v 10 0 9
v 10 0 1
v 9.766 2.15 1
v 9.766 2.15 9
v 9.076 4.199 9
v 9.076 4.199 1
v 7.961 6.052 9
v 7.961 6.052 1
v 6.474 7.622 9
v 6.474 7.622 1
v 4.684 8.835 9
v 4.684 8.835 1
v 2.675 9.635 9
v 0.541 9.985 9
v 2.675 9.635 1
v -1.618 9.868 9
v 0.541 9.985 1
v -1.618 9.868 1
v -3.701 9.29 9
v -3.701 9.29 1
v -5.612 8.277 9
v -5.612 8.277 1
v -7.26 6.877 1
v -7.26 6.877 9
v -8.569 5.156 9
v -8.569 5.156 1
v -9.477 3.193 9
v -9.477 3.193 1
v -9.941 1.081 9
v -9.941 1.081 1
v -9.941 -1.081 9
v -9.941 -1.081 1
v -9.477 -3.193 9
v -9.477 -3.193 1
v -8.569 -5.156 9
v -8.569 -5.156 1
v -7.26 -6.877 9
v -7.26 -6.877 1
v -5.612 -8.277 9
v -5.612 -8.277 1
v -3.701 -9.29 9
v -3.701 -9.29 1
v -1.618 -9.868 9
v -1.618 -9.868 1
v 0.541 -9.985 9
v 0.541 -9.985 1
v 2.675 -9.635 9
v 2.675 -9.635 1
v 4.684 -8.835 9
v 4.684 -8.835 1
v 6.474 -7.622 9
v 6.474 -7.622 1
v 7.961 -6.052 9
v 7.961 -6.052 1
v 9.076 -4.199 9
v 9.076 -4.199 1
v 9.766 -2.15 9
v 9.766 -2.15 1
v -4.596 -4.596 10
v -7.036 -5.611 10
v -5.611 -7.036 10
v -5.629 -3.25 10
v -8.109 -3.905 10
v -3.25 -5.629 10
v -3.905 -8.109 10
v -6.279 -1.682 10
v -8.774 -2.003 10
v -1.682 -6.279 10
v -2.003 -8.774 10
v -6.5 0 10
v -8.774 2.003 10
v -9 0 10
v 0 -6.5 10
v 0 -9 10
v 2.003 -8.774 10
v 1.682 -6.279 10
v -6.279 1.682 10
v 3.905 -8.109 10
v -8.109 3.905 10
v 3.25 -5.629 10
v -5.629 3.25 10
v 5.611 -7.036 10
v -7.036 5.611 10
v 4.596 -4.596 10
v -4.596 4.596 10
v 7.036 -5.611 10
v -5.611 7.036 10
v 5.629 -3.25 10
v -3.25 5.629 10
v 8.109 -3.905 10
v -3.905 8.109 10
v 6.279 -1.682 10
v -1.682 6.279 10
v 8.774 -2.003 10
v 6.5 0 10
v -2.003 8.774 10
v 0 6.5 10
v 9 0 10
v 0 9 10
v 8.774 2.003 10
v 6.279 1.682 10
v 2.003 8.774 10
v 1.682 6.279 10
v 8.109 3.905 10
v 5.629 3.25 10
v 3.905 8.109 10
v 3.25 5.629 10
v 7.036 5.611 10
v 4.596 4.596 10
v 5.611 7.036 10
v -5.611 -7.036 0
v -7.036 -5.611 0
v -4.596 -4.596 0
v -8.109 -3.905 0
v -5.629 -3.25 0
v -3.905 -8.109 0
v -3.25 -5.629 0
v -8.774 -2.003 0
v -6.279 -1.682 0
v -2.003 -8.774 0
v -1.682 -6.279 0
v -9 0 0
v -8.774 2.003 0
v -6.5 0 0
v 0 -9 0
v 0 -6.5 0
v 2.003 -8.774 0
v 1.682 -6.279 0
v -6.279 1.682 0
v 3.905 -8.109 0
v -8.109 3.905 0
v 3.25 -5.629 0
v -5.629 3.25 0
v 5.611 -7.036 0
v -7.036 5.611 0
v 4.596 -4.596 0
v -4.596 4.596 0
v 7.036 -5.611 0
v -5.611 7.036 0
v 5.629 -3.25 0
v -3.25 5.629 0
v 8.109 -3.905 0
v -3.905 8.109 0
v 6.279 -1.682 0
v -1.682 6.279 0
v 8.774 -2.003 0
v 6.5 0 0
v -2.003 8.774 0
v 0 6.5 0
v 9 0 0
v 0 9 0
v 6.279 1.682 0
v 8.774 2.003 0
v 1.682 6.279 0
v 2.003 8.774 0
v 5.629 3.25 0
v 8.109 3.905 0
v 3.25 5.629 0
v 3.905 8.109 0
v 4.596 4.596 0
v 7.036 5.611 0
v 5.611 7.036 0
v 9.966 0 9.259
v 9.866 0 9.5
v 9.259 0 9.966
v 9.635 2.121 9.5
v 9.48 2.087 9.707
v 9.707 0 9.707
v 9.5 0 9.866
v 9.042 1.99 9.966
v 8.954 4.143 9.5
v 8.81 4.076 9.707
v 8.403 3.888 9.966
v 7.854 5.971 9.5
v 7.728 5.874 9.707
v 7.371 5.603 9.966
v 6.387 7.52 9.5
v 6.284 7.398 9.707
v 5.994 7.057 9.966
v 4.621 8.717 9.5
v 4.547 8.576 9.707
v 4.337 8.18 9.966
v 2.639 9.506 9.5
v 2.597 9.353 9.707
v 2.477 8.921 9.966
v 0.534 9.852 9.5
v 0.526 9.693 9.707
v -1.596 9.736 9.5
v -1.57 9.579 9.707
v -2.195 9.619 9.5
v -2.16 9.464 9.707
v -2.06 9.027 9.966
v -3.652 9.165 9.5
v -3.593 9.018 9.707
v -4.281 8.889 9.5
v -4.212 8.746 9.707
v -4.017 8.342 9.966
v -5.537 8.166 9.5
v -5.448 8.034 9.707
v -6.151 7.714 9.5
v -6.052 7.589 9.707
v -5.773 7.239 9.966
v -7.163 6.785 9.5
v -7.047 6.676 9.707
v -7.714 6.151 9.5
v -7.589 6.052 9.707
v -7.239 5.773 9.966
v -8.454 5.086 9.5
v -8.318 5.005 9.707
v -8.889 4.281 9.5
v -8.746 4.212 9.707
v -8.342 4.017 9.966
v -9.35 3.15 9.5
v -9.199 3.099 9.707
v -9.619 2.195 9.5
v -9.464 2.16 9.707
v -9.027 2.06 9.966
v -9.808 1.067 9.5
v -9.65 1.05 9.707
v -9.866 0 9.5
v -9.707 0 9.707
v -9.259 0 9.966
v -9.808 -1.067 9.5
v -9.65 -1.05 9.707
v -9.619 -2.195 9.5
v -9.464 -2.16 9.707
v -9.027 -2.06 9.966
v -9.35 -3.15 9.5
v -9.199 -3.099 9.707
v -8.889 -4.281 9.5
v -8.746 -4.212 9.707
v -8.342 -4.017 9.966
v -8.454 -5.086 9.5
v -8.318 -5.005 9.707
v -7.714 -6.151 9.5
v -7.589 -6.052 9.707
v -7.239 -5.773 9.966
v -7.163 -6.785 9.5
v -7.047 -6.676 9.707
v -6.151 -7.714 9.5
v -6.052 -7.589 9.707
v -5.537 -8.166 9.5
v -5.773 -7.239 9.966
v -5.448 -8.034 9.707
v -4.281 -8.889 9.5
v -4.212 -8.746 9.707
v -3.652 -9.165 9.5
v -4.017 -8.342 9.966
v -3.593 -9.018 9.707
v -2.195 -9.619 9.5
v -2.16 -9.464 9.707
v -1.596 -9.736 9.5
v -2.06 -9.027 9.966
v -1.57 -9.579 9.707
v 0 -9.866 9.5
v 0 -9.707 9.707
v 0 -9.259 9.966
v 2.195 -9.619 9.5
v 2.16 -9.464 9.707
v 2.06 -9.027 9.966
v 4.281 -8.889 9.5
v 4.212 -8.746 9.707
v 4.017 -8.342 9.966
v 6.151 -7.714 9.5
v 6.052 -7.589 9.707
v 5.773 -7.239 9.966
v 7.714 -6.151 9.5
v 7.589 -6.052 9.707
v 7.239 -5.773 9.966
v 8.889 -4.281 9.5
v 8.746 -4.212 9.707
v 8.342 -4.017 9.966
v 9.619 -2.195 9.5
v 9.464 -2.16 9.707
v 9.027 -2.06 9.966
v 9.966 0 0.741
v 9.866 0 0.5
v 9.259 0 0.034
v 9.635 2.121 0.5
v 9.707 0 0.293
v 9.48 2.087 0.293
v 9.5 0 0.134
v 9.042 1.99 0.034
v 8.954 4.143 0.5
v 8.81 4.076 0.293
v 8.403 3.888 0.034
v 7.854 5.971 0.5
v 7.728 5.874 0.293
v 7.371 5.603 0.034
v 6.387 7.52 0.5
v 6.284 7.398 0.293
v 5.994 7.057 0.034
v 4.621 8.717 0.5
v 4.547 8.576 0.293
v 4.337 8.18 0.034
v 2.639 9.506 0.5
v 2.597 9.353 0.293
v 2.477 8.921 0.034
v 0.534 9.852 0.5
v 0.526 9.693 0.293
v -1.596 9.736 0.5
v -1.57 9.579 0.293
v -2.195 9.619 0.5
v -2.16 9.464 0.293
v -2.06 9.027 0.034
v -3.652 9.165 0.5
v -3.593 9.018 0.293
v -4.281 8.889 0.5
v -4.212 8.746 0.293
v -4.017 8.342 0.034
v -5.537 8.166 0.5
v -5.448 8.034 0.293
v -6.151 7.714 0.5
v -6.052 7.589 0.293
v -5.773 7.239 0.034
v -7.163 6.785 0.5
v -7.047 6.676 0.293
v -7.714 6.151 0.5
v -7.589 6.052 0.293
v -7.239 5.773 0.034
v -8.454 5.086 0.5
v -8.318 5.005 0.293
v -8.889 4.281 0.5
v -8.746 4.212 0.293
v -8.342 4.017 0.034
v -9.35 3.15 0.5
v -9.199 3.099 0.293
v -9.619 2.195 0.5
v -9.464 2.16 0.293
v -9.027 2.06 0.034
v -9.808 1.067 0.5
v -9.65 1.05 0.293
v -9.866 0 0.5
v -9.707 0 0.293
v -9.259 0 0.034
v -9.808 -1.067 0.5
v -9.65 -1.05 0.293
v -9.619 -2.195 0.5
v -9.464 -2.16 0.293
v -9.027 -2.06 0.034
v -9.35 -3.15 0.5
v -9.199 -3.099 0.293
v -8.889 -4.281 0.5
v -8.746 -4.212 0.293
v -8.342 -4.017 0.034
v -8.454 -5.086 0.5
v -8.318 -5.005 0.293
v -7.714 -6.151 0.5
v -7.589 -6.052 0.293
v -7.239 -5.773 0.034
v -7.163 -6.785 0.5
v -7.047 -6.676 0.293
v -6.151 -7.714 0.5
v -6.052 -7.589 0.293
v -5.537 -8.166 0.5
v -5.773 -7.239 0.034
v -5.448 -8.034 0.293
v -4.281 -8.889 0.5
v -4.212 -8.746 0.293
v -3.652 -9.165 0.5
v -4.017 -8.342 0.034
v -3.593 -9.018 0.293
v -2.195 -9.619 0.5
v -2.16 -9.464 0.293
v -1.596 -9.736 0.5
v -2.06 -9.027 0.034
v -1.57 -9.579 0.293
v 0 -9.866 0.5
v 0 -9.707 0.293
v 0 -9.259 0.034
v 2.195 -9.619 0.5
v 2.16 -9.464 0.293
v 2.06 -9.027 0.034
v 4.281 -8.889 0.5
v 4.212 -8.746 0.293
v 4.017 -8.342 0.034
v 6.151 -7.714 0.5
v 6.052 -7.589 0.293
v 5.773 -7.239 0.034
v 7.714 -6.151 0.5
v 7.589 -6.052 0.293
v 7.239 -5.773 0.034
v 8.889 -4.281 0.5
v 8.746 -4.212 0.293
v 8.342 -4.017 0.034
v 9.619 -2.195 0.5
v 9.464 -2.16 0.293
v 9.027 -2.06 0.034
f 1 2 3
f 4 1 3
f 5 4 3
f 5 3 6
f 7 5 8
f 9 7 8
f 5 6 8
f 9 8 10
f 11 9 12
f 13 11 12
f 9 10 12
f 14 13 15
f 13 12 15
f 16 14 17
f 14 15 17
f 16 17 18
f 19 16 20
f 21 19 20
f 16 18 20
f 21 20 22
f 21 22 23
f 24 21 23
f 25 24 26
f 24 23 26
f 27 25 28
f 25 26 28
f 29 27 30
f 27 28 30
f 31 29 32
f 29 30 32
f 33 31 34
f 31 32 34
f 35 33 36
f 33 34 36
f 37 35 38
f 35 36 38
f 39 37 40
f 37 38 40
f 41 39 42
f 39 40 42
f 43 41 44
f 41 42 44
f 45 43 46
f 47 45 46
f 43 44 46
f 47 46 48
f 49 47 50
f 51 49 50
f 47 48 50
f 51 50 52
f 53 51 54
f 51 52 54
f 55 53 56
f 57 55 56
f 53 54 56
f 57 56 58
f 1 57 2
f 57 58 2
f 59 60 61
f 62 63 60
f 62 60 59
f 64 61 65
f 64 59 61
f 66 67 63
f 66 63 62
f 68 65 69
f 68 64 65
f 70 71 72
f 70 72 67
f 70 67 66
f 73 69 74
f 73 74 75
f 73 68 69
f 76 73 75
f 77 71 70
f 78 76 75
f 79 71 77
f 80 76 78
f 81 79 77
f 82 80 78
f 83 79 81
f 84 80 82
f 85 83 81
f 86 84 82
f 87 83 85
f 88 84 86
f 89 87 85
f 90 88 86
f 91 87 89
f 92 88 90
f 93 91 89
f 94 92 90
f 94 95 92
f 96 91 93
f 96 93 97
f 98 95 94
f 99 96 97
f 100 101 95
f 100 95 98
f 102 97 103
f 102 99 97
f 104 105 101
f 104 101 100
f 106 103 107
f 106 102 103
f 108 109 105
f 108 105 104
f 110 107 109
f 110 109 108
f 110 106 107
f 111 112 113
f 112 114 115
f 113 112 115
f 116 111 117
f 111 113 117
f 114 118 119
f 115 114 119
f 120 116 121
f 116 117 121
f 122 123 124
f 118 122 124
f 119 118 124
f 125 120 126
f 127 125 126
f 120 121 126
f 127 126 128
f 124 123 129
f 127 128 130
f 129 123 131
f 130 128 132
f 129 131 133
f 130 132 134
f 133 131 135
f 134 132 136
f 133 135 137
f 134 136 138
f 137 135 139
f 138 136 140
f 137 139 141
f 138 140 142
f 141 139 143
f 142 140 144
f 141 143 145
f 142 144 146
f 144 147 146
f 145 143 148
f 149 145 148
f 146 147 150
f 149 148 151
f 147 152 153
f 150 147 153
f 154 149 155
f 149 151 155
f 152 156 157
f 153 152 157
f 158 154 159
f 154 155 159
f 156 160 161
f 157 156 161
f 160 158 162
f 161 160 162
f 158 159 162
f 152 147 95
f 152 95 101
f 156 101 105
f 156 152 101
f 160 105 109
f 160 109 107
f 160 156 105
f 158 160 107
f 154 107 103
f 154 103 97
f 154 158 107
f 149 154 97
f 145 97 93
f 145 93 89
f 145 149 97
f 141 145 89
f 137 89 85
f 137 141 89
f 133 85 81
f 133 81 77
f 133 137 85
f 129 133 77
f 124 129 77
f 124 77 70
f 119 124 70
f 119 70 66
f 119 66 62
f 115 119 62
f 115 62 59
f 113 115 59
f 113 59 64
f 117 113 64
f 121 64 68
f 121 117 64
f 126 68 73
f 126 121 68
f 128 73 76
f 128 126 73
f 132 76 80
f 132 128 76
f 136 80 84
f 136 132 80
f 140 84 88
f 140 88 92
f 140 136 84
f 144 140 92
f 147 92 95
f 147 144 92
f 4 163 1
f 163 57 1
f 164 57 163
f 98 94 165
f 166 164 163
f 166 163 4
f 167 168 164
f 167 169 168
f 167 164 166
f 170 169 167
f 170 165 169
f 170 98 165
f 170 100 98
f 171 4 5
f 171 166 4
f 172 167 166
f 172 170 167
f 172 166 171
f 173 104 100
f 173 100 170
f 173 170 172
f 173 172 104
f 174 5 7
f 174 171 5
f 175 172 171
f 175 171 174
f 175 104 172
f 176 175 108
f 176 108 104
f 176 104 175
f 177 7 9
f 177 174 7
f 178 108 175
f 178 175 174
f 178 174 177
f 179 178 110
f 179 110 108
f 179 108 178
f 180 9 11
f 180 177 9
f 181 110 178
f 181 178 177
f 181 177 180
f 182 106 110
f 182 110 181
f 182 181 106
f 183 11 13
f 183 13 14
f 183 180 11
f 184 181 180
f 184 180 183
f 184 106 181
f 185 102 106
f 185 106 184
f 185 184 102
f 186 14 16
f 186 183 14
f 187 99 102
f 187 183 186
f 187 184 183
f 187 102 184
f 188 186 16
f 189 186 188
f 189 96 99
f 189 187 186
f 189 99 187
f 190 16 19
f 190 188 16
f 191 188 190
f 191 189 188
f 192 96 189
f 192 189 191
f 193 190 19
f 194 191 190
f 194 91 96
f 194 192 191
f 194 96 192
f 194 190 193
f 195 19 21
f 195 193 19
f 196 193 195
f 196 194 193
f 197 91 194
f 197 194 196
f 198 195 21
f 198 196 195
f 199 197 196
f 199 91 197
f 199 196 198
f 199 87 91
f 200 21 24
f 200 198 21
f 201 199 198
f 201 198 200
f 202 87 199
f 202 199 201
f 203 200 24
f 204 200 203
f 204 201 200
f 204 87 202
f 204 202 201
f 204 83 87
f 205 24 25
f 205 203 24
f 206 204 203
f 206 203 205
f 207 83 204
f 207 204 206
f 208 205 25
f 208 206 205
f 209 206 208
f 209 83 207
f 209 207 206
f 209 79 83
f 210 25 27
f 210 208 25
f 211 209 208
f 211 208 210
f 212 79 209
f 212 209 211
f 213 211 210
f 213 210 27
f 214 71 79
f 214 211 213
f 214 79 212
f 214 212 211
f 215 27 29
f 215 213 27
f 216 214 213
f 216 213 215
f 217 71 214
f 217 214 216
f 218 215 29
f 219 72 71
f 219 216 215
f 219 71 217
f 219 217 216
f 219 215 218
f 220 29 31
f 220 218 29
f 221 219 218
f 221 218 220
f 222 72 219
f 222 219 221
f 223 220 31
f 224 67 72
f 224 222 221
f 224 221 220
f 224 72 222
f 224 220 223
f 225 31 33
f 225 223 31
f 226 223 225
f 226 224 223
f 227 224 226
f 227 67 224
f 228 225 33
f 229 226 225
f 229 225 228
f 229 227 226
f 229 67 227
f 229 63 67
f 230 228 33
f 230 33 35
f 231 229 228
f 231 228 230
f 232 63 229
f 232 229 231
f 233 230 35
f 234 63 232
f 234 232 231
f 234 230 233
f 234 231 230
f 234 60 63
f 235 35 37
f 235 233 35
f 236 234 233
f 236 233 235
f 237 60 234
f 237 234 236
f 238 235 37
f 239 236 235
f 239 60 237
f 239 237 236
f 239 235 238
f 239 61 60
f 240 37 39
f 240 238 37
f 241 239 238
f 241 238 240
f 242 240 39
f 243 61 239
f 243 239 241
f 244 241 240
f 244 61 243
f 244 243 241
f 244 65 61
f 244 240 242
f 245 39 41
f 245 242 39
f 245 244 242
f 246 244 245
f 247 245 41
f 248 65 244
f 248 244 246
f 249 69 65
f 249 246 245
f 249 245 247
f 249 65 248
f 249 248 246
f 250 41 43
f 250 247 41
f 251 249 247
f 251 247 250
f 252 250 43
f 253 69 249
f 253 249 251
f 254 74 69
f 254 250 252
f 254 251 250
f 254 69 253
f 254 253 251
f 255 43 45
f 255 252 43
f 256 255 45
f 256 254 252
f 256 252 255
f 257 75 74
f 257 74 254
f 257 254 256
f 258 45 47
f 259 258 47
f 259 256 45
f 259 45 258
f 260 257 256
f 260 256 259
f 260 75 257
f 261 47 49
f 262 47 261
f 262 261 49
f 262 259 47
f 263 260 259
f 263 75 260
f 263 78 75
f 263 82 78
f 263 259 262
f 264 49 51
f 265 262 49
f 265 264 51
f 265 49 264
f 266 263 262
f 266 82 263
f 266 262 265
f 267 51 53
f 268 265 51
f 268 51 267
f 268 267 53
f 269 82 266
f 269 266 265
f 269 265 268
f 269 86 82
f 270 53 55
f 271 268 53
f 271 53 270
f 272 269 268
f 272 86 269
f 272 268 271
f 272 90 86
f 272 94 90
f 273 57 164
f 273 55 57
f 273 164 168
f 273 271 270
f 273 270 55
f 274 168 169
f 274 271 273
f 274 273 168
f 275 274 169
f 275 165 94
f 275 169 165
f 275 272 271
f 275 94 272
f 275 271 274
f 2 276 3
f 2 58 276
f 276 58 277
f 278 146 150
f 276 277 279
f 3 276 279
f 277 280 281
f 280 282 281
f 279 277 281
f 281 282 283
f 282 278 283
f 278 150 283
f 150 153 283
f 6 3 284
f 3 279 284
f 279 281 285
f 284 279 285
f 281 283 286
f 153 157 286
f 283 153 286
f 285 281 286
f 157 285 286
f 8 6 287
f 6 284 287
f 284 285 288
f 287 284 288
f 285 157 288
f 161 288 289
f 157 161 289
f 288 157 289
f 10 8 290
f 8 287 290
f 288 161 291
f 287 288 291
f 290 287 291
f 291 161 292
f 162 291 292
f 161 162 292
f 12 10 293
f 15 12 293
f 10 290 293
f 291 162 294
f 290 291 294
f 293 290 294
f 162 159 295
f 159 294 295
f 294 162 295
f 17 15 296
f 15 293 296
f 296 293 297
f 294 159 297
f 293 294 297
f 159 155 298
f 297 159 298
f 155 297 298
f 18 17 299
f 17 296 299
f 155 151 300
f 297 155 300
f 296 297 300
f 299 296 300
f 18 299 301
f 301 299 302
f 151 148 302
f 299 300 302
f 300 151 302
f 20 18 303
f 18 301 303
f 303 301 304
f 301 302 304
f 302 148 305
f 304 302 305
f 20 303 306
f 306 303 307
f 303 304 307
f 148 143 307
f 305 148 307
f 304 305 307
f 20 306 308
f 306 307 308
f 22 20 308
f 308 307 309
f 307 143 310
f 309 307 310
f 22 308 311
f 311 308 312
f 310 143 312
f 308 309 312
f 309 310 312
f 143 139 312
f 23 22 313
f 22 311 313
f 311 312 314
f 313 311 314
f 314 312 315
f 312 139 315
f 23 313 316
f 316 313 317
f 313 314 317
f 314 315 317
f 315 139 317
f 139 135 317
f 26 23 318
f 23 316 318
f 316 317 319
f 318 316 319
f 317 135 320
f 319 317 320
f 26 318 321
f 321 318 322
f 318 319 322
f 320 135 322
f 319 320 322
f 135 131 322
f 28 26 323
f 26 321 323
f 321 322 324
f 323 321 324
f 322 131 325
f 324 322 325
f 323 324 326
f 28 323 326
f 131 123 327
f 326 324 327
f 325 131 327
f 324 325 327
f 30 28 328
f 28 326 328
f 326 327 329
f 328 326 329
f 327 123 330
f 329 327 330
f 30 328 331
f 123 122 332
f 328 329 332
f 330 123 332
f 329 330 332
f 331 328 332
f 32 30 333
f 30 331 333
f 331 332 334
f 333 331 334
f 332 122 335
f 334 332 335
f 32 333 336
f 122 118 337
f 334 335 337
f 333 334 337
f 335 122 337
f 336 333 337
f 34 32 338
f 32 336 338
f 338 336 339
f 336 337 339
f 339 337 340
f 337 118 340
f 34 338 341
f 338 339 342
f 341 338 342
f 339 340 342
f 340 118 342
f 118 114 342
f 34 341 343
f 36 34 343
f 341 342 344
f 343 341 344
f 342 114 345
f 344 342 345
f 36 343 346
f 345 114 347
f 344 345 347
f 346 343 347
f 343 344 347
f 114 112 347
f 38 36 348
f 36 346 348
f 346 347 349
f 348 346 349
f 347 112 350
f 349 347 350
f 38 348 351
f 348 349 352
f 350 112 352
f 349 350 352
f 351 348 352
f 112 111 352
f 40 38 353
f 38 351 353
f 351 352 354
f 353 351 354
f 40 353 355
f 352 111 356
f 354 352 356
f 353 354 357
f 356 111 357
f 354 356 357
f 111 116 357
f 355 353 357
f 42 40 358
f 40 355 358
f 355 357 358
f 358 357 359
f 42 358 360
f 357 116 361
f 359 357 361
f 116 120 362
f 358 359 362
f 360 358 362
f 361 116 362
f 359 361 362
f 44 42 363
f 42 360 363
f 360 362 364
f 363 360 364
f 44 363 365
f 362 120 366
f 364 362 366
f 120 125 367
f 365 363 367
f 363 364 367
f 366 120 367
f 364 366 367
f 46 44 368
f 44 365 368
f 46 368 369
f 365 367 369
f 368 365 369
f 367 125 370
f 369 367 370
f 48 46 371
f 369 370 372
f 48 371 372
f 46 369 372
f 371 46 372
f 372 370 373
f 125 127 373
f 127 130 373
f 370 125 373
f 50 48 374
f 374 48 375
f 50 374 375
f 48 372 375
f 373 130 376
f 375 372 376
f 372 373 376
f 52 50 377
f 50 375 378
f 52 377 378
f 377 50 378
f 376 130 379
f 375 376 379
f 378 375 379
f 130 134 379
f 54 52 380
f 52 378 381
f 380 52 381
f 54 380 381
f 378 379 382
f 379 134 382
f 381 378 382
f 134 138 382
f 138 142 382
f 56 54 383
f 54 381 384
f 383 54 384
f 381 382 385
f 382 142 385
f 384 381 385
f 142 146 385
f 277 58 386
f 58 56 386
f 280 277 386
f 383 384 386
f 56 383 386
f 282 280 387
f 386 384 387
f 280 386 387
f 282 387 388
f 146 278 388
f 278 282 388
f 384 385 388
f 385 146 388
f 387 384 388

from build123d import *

# Parameters (mm, degrees)
F0_R     = 10
F0_R_2   = 6.5
F1_DEPTH = 10
F2_R     = 1
F3_R     = 1


with BuildPart() as f1:
    # F0 (on Top) → F1 (new body)
    with BuildSketch(Plane.XY):
        Circle(F0_R)
        Circle(F0_R_2, mode=Mode.SUBTRACT)
    extrude(amount=F1_DEPTH)

    # F2
    f2_edges = [f1.edges().sort_by_distance(p)[0] for p in [
        (-10, 0, 10),
    ]]
    fillet(f2_edges, radius=F2_R)

    # F3
    f3_edges = [f1.edges().sort_by_distance(p)[0] for p in [
        (-10, 0, 0),
    ]]
    fillet(f3_edges, radius=F3_R)


solid = f1.part
